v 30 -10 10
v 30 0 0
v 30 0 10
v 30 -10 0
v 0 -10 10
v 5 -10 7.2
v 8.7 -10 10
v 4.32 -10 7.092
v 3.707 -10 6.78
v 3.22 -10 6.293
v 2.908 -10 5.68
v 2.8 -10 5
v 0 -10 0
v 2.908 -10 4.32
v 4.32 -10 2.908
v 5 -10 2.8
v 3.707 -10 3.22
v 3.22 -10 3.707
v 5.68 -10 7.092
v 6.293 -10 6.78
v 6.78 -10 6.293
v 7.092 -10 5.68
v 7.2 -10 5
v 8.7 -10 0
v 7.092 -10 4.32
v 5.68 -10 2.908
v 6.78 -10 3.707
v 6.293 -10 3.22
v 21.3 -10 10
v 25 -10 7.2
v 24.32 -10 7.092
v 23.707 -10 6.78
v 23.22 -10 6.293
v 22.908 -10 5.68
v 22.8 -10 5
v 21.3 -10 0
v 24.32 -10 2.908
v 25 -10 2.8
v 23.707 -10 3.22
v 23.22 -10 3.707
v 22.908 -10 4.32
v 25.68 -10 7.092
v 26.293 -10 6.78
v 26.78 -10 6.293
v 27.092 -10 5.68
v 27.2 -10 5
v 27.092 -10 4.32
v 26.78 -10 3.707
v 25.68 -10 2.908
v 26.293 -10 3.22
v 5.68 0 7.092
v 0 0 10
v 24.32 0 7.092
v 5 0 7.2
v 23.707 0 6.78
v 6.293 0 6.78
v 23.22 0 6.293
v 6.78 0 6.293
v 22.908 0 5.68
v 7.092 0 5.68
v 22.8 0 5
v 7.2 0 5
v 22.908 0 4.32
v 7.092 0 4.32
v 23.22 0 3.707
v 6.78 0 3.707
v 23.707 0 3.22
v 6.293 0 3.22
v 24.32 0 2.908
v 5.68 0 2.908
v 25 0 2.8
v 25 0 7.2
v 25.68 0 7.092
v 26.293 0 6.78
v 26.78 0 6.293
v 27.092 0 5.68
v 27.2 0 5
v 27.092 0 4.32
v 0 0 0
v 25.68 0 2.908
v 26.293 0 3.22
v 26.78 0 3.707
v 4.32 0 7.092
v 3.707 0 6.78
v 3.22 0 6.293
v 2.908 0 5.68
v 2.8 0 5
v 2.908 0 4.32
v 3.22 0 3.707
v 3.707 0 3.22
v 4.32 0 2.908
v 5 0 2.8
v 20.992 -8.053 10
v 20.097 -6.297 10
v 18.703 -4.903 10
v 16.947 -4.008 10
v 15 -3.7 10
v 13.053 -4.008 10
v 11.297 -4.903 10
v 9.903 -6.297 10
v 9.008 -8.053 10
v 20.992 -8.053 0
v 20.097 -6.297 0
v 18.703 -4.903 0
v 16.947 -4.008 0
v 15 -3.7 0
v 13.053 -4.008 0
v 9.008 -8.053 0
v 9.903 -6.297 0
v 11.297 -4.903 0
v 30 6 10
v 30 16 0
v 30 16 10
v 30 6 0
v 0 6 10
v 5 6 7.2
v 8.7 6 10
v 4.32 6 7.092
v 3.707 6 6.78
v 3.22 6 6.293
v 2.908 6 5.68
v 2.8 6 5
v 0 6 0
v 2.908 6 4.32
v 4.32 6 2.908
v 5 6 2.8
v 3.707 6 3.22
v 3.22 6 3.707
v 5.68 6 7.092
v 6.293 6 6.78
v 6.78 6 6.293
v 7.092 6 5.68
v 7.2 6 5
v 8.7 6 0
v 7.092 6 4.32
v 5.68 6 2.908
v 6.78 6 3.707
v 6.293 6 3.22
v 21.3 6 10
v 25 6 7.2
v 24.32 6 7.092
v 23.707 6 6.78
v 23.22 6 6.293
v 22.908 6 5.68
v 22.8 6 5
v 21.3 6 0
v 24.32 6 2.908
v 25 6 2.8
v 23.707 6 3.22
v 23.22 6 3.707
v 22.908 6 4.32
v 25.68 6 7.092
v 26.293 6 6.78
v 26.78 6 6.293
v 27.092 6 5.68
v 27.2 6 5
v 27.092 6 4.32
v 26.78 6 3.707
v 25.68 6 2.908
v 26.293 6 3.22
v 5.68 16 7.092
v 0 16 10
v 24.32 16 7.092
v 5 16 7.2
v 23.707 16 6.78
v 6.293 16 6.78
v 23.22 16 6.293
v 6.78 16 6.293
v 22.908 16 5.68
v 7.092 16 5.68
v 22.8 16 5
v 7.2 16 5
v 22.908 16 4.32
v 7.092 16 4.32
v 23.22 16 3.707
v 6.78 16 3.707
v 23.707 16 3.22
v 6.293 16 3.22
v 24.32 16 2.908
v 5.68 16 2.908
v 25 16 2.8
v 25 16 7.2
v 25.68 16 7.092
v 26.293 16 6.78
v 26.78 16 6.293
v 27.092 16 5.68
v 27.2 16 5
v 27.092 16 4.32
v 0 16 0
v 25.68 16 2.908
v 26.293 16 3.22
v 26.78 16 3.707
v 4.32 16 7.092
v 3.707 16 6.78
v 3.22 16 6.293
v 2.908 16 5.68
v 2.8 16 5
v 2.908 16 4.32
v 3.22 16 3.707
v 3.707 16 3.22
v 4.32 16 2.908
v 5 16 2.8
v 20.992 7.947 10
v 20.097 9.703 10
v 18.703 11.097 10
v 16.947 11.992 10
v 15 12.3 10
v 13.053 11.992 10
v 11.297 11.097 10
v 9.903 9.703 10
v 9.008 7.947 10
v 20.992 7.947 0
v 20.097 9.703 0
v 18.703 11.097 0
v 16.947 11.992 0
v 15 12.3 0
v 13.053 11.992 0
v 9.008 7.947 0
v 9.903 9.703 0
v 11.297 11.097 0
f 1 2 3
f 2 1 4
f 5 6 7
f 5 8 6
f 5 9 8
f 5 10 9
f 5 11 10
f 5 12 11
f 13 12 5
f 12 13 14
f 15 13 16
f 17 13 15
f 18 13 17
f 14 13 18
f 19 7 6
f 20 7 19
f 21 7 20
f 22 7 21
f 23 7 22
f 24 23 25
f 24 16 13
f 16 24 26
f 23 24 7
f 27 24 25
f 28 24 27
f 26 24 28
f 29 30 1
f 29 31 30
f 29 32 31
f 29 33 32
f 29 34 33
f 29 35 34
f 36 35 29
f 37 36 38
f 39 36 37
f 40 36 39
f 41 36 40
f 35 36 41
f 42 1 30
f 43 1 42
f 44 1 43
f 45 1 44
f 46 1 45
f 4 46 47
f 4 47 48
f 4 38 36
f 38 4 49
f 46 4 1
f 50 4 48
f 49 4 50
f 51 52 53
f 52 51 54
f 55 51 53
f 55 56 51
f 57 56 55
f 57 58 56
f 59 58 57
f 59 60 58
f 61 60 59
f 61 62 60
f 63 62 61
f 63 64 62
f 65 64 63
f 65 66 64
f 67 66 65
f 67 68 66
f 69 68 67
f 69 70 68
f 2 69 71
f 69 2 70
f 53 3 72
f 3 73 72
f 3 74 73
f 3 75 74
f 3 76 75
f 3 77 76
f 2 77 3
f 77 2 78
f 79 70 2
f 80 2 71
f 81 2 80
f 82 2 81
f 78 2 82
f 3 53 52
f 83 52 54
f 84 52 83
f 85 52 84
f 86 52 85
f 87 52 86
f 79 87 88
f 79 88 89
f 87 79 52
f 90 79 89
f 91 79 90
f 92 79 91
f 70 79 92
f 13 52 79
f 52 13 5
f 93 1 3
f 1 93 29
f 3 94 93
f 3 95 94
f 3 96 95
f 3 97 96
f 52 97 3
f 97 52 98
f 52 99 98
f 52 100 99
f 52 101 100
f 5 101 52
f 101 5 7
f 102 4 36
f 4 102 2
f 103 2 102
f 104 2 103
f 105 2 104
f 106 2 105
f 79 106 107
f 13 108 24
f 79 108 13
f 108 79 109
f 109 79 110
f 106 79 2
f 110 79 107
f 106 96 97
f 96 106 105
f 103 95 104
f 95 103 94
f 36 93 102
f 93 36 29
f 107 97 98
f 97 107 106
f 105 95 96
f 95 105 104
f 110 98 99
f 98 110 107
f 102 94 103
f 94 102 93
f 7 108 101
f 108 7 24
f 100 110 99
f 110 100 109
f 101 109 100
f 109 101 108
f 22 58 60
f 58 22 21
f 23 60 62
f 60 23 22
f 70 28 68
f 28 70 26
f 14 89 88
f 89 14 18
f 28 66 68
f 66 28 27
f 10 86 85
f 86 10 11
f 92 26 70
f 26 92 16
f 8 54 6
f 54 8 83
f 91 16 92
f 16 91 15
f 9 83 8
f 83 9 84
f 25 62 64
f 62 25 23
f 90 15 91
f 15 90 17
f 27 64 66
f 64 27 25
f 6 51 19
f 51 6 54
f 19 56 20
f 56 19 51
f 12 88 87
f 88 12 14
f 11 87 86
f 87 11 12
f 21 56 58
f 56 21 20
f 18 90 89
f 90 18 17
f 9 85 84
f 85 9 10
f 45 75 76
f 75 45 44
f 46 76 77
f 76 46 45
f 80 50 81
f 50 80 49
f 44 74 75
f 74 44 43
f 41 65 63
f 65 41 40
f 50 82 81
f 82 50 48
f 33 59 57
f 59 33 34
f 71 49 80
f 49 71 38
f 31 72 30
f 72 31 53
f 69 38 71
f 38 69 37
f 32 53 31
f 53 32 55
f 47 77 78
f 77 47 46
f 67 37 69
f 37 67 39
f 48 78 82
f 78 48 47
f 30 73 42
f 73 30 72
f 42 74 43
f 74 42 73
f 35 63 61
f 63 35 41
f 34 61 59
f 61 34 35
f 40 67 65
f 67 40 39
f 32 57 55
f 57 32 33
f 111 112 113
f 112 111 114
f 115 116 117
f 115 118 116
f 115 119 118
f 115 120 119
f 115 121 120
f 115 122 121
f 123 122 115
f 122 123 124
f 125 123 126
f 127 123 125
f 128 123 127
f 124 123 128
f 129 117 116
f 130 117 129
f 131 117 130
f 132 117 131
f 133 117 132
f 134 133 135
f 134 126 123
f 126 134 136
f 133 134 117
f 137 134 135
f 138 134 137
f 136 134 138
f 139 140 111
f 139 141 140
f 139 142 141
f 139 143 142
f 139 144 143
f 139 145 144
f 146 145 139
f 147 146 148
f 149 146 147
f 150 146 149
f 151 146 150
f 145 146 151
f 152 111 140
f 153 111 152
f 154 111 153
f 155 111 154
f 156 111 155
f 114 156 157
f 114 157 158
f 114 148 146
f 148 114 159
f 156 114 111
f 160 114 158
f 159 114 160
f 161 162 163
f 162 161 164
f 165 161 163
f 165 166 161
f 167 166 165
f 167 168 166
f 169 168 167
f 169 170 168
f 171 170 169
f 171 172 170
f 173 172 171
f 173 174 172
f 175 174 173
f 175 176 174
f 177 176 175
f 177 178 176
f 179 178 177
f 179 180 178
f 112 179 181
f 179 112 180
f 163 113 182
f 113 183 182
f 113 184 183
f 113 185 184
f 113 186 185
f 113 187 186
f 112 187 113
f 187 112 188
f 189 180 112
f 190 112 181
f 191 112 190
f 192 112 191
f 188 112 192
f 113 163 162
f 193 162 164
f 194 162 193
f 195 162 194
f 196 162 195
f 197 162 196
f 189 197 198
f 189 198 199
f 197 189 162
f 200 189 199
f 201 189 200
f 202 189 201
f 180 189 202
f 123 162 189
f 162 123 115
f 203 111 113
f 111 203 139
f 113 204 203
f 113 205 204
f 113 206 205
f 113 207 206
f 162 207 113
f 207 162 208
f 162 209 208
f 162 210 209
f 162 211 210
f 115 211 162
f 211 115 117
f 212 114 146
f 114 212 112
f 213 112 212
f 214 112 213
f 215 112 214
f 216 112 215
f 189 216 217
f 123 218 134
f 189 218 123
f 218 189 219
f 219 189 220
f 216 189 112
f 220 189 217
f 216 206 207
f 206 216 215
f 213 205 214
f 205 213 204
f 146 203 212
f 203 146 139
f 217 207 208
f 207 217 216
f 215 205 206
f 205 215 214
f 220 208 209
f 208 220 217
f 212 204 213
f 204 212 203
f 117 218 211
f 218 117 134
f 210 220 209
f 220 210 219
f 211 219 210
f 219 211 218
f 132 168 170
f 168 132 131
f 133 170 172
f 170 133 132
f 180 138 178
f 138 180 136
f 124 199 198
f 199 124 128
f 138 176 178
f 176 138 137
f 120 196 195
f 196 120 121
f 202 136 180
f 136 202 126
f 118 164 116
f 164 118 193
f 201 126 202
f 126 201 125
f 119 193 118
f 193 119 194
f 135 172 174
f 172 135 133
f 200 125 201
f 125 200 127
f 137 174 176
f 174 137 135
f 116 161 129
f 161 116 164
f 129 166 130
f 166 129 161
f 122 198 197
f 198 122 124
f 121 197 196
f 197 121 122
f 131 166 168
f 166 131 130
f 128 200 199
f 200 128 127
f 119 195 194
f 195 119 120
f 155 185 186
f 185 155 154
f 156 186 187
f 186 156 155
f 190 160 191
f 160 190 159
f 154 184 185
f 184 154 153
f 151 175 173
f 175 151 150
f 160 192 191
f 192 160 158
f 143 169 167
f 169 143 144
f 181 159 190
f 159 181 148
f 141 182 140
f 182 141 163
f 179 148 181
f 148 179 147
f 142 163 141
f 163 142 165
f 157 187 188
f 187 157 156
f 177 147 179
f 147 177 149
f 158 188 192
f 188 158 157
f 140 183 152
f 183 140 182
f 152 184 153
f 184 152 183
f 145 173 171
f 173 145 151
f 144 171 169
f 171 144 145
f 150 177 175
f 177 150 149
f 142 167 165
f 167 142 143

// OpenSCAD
// half-holder for bearing from HDD
$fn = 20;
d_o = 12 + 0.6;
// d_o1 = 7;
r_ho = 2.2;

// z_b = 4;
// z_1 = 1;
z_a = 10;

x_1 = 30;
y_1 = 10;

module bearing_hbox()
{
  //translate([0,0,z_1]) cylinder(h=2*z_b, r = d_o/2.0, center = true );
  rotate([90,0,0])
  difference() {
    cube([x_1,y_1,z_a] );
    translate([x_1/2,y_1*1.1,z_a])
      rotate([90,0,0])
        cylinder(h=y_1*2, r = d_o/2.0 );

    translate([ 5,y_1/2,0])  cylinder(h=2*z_a, r = r_ho );
    translate([25,y_1/2,0])  cylinder(h=2*z_a, r = r_ho );
  }
}

bearing_hbox();

translate([0,y_1+6,0]) bearing_hbox();
